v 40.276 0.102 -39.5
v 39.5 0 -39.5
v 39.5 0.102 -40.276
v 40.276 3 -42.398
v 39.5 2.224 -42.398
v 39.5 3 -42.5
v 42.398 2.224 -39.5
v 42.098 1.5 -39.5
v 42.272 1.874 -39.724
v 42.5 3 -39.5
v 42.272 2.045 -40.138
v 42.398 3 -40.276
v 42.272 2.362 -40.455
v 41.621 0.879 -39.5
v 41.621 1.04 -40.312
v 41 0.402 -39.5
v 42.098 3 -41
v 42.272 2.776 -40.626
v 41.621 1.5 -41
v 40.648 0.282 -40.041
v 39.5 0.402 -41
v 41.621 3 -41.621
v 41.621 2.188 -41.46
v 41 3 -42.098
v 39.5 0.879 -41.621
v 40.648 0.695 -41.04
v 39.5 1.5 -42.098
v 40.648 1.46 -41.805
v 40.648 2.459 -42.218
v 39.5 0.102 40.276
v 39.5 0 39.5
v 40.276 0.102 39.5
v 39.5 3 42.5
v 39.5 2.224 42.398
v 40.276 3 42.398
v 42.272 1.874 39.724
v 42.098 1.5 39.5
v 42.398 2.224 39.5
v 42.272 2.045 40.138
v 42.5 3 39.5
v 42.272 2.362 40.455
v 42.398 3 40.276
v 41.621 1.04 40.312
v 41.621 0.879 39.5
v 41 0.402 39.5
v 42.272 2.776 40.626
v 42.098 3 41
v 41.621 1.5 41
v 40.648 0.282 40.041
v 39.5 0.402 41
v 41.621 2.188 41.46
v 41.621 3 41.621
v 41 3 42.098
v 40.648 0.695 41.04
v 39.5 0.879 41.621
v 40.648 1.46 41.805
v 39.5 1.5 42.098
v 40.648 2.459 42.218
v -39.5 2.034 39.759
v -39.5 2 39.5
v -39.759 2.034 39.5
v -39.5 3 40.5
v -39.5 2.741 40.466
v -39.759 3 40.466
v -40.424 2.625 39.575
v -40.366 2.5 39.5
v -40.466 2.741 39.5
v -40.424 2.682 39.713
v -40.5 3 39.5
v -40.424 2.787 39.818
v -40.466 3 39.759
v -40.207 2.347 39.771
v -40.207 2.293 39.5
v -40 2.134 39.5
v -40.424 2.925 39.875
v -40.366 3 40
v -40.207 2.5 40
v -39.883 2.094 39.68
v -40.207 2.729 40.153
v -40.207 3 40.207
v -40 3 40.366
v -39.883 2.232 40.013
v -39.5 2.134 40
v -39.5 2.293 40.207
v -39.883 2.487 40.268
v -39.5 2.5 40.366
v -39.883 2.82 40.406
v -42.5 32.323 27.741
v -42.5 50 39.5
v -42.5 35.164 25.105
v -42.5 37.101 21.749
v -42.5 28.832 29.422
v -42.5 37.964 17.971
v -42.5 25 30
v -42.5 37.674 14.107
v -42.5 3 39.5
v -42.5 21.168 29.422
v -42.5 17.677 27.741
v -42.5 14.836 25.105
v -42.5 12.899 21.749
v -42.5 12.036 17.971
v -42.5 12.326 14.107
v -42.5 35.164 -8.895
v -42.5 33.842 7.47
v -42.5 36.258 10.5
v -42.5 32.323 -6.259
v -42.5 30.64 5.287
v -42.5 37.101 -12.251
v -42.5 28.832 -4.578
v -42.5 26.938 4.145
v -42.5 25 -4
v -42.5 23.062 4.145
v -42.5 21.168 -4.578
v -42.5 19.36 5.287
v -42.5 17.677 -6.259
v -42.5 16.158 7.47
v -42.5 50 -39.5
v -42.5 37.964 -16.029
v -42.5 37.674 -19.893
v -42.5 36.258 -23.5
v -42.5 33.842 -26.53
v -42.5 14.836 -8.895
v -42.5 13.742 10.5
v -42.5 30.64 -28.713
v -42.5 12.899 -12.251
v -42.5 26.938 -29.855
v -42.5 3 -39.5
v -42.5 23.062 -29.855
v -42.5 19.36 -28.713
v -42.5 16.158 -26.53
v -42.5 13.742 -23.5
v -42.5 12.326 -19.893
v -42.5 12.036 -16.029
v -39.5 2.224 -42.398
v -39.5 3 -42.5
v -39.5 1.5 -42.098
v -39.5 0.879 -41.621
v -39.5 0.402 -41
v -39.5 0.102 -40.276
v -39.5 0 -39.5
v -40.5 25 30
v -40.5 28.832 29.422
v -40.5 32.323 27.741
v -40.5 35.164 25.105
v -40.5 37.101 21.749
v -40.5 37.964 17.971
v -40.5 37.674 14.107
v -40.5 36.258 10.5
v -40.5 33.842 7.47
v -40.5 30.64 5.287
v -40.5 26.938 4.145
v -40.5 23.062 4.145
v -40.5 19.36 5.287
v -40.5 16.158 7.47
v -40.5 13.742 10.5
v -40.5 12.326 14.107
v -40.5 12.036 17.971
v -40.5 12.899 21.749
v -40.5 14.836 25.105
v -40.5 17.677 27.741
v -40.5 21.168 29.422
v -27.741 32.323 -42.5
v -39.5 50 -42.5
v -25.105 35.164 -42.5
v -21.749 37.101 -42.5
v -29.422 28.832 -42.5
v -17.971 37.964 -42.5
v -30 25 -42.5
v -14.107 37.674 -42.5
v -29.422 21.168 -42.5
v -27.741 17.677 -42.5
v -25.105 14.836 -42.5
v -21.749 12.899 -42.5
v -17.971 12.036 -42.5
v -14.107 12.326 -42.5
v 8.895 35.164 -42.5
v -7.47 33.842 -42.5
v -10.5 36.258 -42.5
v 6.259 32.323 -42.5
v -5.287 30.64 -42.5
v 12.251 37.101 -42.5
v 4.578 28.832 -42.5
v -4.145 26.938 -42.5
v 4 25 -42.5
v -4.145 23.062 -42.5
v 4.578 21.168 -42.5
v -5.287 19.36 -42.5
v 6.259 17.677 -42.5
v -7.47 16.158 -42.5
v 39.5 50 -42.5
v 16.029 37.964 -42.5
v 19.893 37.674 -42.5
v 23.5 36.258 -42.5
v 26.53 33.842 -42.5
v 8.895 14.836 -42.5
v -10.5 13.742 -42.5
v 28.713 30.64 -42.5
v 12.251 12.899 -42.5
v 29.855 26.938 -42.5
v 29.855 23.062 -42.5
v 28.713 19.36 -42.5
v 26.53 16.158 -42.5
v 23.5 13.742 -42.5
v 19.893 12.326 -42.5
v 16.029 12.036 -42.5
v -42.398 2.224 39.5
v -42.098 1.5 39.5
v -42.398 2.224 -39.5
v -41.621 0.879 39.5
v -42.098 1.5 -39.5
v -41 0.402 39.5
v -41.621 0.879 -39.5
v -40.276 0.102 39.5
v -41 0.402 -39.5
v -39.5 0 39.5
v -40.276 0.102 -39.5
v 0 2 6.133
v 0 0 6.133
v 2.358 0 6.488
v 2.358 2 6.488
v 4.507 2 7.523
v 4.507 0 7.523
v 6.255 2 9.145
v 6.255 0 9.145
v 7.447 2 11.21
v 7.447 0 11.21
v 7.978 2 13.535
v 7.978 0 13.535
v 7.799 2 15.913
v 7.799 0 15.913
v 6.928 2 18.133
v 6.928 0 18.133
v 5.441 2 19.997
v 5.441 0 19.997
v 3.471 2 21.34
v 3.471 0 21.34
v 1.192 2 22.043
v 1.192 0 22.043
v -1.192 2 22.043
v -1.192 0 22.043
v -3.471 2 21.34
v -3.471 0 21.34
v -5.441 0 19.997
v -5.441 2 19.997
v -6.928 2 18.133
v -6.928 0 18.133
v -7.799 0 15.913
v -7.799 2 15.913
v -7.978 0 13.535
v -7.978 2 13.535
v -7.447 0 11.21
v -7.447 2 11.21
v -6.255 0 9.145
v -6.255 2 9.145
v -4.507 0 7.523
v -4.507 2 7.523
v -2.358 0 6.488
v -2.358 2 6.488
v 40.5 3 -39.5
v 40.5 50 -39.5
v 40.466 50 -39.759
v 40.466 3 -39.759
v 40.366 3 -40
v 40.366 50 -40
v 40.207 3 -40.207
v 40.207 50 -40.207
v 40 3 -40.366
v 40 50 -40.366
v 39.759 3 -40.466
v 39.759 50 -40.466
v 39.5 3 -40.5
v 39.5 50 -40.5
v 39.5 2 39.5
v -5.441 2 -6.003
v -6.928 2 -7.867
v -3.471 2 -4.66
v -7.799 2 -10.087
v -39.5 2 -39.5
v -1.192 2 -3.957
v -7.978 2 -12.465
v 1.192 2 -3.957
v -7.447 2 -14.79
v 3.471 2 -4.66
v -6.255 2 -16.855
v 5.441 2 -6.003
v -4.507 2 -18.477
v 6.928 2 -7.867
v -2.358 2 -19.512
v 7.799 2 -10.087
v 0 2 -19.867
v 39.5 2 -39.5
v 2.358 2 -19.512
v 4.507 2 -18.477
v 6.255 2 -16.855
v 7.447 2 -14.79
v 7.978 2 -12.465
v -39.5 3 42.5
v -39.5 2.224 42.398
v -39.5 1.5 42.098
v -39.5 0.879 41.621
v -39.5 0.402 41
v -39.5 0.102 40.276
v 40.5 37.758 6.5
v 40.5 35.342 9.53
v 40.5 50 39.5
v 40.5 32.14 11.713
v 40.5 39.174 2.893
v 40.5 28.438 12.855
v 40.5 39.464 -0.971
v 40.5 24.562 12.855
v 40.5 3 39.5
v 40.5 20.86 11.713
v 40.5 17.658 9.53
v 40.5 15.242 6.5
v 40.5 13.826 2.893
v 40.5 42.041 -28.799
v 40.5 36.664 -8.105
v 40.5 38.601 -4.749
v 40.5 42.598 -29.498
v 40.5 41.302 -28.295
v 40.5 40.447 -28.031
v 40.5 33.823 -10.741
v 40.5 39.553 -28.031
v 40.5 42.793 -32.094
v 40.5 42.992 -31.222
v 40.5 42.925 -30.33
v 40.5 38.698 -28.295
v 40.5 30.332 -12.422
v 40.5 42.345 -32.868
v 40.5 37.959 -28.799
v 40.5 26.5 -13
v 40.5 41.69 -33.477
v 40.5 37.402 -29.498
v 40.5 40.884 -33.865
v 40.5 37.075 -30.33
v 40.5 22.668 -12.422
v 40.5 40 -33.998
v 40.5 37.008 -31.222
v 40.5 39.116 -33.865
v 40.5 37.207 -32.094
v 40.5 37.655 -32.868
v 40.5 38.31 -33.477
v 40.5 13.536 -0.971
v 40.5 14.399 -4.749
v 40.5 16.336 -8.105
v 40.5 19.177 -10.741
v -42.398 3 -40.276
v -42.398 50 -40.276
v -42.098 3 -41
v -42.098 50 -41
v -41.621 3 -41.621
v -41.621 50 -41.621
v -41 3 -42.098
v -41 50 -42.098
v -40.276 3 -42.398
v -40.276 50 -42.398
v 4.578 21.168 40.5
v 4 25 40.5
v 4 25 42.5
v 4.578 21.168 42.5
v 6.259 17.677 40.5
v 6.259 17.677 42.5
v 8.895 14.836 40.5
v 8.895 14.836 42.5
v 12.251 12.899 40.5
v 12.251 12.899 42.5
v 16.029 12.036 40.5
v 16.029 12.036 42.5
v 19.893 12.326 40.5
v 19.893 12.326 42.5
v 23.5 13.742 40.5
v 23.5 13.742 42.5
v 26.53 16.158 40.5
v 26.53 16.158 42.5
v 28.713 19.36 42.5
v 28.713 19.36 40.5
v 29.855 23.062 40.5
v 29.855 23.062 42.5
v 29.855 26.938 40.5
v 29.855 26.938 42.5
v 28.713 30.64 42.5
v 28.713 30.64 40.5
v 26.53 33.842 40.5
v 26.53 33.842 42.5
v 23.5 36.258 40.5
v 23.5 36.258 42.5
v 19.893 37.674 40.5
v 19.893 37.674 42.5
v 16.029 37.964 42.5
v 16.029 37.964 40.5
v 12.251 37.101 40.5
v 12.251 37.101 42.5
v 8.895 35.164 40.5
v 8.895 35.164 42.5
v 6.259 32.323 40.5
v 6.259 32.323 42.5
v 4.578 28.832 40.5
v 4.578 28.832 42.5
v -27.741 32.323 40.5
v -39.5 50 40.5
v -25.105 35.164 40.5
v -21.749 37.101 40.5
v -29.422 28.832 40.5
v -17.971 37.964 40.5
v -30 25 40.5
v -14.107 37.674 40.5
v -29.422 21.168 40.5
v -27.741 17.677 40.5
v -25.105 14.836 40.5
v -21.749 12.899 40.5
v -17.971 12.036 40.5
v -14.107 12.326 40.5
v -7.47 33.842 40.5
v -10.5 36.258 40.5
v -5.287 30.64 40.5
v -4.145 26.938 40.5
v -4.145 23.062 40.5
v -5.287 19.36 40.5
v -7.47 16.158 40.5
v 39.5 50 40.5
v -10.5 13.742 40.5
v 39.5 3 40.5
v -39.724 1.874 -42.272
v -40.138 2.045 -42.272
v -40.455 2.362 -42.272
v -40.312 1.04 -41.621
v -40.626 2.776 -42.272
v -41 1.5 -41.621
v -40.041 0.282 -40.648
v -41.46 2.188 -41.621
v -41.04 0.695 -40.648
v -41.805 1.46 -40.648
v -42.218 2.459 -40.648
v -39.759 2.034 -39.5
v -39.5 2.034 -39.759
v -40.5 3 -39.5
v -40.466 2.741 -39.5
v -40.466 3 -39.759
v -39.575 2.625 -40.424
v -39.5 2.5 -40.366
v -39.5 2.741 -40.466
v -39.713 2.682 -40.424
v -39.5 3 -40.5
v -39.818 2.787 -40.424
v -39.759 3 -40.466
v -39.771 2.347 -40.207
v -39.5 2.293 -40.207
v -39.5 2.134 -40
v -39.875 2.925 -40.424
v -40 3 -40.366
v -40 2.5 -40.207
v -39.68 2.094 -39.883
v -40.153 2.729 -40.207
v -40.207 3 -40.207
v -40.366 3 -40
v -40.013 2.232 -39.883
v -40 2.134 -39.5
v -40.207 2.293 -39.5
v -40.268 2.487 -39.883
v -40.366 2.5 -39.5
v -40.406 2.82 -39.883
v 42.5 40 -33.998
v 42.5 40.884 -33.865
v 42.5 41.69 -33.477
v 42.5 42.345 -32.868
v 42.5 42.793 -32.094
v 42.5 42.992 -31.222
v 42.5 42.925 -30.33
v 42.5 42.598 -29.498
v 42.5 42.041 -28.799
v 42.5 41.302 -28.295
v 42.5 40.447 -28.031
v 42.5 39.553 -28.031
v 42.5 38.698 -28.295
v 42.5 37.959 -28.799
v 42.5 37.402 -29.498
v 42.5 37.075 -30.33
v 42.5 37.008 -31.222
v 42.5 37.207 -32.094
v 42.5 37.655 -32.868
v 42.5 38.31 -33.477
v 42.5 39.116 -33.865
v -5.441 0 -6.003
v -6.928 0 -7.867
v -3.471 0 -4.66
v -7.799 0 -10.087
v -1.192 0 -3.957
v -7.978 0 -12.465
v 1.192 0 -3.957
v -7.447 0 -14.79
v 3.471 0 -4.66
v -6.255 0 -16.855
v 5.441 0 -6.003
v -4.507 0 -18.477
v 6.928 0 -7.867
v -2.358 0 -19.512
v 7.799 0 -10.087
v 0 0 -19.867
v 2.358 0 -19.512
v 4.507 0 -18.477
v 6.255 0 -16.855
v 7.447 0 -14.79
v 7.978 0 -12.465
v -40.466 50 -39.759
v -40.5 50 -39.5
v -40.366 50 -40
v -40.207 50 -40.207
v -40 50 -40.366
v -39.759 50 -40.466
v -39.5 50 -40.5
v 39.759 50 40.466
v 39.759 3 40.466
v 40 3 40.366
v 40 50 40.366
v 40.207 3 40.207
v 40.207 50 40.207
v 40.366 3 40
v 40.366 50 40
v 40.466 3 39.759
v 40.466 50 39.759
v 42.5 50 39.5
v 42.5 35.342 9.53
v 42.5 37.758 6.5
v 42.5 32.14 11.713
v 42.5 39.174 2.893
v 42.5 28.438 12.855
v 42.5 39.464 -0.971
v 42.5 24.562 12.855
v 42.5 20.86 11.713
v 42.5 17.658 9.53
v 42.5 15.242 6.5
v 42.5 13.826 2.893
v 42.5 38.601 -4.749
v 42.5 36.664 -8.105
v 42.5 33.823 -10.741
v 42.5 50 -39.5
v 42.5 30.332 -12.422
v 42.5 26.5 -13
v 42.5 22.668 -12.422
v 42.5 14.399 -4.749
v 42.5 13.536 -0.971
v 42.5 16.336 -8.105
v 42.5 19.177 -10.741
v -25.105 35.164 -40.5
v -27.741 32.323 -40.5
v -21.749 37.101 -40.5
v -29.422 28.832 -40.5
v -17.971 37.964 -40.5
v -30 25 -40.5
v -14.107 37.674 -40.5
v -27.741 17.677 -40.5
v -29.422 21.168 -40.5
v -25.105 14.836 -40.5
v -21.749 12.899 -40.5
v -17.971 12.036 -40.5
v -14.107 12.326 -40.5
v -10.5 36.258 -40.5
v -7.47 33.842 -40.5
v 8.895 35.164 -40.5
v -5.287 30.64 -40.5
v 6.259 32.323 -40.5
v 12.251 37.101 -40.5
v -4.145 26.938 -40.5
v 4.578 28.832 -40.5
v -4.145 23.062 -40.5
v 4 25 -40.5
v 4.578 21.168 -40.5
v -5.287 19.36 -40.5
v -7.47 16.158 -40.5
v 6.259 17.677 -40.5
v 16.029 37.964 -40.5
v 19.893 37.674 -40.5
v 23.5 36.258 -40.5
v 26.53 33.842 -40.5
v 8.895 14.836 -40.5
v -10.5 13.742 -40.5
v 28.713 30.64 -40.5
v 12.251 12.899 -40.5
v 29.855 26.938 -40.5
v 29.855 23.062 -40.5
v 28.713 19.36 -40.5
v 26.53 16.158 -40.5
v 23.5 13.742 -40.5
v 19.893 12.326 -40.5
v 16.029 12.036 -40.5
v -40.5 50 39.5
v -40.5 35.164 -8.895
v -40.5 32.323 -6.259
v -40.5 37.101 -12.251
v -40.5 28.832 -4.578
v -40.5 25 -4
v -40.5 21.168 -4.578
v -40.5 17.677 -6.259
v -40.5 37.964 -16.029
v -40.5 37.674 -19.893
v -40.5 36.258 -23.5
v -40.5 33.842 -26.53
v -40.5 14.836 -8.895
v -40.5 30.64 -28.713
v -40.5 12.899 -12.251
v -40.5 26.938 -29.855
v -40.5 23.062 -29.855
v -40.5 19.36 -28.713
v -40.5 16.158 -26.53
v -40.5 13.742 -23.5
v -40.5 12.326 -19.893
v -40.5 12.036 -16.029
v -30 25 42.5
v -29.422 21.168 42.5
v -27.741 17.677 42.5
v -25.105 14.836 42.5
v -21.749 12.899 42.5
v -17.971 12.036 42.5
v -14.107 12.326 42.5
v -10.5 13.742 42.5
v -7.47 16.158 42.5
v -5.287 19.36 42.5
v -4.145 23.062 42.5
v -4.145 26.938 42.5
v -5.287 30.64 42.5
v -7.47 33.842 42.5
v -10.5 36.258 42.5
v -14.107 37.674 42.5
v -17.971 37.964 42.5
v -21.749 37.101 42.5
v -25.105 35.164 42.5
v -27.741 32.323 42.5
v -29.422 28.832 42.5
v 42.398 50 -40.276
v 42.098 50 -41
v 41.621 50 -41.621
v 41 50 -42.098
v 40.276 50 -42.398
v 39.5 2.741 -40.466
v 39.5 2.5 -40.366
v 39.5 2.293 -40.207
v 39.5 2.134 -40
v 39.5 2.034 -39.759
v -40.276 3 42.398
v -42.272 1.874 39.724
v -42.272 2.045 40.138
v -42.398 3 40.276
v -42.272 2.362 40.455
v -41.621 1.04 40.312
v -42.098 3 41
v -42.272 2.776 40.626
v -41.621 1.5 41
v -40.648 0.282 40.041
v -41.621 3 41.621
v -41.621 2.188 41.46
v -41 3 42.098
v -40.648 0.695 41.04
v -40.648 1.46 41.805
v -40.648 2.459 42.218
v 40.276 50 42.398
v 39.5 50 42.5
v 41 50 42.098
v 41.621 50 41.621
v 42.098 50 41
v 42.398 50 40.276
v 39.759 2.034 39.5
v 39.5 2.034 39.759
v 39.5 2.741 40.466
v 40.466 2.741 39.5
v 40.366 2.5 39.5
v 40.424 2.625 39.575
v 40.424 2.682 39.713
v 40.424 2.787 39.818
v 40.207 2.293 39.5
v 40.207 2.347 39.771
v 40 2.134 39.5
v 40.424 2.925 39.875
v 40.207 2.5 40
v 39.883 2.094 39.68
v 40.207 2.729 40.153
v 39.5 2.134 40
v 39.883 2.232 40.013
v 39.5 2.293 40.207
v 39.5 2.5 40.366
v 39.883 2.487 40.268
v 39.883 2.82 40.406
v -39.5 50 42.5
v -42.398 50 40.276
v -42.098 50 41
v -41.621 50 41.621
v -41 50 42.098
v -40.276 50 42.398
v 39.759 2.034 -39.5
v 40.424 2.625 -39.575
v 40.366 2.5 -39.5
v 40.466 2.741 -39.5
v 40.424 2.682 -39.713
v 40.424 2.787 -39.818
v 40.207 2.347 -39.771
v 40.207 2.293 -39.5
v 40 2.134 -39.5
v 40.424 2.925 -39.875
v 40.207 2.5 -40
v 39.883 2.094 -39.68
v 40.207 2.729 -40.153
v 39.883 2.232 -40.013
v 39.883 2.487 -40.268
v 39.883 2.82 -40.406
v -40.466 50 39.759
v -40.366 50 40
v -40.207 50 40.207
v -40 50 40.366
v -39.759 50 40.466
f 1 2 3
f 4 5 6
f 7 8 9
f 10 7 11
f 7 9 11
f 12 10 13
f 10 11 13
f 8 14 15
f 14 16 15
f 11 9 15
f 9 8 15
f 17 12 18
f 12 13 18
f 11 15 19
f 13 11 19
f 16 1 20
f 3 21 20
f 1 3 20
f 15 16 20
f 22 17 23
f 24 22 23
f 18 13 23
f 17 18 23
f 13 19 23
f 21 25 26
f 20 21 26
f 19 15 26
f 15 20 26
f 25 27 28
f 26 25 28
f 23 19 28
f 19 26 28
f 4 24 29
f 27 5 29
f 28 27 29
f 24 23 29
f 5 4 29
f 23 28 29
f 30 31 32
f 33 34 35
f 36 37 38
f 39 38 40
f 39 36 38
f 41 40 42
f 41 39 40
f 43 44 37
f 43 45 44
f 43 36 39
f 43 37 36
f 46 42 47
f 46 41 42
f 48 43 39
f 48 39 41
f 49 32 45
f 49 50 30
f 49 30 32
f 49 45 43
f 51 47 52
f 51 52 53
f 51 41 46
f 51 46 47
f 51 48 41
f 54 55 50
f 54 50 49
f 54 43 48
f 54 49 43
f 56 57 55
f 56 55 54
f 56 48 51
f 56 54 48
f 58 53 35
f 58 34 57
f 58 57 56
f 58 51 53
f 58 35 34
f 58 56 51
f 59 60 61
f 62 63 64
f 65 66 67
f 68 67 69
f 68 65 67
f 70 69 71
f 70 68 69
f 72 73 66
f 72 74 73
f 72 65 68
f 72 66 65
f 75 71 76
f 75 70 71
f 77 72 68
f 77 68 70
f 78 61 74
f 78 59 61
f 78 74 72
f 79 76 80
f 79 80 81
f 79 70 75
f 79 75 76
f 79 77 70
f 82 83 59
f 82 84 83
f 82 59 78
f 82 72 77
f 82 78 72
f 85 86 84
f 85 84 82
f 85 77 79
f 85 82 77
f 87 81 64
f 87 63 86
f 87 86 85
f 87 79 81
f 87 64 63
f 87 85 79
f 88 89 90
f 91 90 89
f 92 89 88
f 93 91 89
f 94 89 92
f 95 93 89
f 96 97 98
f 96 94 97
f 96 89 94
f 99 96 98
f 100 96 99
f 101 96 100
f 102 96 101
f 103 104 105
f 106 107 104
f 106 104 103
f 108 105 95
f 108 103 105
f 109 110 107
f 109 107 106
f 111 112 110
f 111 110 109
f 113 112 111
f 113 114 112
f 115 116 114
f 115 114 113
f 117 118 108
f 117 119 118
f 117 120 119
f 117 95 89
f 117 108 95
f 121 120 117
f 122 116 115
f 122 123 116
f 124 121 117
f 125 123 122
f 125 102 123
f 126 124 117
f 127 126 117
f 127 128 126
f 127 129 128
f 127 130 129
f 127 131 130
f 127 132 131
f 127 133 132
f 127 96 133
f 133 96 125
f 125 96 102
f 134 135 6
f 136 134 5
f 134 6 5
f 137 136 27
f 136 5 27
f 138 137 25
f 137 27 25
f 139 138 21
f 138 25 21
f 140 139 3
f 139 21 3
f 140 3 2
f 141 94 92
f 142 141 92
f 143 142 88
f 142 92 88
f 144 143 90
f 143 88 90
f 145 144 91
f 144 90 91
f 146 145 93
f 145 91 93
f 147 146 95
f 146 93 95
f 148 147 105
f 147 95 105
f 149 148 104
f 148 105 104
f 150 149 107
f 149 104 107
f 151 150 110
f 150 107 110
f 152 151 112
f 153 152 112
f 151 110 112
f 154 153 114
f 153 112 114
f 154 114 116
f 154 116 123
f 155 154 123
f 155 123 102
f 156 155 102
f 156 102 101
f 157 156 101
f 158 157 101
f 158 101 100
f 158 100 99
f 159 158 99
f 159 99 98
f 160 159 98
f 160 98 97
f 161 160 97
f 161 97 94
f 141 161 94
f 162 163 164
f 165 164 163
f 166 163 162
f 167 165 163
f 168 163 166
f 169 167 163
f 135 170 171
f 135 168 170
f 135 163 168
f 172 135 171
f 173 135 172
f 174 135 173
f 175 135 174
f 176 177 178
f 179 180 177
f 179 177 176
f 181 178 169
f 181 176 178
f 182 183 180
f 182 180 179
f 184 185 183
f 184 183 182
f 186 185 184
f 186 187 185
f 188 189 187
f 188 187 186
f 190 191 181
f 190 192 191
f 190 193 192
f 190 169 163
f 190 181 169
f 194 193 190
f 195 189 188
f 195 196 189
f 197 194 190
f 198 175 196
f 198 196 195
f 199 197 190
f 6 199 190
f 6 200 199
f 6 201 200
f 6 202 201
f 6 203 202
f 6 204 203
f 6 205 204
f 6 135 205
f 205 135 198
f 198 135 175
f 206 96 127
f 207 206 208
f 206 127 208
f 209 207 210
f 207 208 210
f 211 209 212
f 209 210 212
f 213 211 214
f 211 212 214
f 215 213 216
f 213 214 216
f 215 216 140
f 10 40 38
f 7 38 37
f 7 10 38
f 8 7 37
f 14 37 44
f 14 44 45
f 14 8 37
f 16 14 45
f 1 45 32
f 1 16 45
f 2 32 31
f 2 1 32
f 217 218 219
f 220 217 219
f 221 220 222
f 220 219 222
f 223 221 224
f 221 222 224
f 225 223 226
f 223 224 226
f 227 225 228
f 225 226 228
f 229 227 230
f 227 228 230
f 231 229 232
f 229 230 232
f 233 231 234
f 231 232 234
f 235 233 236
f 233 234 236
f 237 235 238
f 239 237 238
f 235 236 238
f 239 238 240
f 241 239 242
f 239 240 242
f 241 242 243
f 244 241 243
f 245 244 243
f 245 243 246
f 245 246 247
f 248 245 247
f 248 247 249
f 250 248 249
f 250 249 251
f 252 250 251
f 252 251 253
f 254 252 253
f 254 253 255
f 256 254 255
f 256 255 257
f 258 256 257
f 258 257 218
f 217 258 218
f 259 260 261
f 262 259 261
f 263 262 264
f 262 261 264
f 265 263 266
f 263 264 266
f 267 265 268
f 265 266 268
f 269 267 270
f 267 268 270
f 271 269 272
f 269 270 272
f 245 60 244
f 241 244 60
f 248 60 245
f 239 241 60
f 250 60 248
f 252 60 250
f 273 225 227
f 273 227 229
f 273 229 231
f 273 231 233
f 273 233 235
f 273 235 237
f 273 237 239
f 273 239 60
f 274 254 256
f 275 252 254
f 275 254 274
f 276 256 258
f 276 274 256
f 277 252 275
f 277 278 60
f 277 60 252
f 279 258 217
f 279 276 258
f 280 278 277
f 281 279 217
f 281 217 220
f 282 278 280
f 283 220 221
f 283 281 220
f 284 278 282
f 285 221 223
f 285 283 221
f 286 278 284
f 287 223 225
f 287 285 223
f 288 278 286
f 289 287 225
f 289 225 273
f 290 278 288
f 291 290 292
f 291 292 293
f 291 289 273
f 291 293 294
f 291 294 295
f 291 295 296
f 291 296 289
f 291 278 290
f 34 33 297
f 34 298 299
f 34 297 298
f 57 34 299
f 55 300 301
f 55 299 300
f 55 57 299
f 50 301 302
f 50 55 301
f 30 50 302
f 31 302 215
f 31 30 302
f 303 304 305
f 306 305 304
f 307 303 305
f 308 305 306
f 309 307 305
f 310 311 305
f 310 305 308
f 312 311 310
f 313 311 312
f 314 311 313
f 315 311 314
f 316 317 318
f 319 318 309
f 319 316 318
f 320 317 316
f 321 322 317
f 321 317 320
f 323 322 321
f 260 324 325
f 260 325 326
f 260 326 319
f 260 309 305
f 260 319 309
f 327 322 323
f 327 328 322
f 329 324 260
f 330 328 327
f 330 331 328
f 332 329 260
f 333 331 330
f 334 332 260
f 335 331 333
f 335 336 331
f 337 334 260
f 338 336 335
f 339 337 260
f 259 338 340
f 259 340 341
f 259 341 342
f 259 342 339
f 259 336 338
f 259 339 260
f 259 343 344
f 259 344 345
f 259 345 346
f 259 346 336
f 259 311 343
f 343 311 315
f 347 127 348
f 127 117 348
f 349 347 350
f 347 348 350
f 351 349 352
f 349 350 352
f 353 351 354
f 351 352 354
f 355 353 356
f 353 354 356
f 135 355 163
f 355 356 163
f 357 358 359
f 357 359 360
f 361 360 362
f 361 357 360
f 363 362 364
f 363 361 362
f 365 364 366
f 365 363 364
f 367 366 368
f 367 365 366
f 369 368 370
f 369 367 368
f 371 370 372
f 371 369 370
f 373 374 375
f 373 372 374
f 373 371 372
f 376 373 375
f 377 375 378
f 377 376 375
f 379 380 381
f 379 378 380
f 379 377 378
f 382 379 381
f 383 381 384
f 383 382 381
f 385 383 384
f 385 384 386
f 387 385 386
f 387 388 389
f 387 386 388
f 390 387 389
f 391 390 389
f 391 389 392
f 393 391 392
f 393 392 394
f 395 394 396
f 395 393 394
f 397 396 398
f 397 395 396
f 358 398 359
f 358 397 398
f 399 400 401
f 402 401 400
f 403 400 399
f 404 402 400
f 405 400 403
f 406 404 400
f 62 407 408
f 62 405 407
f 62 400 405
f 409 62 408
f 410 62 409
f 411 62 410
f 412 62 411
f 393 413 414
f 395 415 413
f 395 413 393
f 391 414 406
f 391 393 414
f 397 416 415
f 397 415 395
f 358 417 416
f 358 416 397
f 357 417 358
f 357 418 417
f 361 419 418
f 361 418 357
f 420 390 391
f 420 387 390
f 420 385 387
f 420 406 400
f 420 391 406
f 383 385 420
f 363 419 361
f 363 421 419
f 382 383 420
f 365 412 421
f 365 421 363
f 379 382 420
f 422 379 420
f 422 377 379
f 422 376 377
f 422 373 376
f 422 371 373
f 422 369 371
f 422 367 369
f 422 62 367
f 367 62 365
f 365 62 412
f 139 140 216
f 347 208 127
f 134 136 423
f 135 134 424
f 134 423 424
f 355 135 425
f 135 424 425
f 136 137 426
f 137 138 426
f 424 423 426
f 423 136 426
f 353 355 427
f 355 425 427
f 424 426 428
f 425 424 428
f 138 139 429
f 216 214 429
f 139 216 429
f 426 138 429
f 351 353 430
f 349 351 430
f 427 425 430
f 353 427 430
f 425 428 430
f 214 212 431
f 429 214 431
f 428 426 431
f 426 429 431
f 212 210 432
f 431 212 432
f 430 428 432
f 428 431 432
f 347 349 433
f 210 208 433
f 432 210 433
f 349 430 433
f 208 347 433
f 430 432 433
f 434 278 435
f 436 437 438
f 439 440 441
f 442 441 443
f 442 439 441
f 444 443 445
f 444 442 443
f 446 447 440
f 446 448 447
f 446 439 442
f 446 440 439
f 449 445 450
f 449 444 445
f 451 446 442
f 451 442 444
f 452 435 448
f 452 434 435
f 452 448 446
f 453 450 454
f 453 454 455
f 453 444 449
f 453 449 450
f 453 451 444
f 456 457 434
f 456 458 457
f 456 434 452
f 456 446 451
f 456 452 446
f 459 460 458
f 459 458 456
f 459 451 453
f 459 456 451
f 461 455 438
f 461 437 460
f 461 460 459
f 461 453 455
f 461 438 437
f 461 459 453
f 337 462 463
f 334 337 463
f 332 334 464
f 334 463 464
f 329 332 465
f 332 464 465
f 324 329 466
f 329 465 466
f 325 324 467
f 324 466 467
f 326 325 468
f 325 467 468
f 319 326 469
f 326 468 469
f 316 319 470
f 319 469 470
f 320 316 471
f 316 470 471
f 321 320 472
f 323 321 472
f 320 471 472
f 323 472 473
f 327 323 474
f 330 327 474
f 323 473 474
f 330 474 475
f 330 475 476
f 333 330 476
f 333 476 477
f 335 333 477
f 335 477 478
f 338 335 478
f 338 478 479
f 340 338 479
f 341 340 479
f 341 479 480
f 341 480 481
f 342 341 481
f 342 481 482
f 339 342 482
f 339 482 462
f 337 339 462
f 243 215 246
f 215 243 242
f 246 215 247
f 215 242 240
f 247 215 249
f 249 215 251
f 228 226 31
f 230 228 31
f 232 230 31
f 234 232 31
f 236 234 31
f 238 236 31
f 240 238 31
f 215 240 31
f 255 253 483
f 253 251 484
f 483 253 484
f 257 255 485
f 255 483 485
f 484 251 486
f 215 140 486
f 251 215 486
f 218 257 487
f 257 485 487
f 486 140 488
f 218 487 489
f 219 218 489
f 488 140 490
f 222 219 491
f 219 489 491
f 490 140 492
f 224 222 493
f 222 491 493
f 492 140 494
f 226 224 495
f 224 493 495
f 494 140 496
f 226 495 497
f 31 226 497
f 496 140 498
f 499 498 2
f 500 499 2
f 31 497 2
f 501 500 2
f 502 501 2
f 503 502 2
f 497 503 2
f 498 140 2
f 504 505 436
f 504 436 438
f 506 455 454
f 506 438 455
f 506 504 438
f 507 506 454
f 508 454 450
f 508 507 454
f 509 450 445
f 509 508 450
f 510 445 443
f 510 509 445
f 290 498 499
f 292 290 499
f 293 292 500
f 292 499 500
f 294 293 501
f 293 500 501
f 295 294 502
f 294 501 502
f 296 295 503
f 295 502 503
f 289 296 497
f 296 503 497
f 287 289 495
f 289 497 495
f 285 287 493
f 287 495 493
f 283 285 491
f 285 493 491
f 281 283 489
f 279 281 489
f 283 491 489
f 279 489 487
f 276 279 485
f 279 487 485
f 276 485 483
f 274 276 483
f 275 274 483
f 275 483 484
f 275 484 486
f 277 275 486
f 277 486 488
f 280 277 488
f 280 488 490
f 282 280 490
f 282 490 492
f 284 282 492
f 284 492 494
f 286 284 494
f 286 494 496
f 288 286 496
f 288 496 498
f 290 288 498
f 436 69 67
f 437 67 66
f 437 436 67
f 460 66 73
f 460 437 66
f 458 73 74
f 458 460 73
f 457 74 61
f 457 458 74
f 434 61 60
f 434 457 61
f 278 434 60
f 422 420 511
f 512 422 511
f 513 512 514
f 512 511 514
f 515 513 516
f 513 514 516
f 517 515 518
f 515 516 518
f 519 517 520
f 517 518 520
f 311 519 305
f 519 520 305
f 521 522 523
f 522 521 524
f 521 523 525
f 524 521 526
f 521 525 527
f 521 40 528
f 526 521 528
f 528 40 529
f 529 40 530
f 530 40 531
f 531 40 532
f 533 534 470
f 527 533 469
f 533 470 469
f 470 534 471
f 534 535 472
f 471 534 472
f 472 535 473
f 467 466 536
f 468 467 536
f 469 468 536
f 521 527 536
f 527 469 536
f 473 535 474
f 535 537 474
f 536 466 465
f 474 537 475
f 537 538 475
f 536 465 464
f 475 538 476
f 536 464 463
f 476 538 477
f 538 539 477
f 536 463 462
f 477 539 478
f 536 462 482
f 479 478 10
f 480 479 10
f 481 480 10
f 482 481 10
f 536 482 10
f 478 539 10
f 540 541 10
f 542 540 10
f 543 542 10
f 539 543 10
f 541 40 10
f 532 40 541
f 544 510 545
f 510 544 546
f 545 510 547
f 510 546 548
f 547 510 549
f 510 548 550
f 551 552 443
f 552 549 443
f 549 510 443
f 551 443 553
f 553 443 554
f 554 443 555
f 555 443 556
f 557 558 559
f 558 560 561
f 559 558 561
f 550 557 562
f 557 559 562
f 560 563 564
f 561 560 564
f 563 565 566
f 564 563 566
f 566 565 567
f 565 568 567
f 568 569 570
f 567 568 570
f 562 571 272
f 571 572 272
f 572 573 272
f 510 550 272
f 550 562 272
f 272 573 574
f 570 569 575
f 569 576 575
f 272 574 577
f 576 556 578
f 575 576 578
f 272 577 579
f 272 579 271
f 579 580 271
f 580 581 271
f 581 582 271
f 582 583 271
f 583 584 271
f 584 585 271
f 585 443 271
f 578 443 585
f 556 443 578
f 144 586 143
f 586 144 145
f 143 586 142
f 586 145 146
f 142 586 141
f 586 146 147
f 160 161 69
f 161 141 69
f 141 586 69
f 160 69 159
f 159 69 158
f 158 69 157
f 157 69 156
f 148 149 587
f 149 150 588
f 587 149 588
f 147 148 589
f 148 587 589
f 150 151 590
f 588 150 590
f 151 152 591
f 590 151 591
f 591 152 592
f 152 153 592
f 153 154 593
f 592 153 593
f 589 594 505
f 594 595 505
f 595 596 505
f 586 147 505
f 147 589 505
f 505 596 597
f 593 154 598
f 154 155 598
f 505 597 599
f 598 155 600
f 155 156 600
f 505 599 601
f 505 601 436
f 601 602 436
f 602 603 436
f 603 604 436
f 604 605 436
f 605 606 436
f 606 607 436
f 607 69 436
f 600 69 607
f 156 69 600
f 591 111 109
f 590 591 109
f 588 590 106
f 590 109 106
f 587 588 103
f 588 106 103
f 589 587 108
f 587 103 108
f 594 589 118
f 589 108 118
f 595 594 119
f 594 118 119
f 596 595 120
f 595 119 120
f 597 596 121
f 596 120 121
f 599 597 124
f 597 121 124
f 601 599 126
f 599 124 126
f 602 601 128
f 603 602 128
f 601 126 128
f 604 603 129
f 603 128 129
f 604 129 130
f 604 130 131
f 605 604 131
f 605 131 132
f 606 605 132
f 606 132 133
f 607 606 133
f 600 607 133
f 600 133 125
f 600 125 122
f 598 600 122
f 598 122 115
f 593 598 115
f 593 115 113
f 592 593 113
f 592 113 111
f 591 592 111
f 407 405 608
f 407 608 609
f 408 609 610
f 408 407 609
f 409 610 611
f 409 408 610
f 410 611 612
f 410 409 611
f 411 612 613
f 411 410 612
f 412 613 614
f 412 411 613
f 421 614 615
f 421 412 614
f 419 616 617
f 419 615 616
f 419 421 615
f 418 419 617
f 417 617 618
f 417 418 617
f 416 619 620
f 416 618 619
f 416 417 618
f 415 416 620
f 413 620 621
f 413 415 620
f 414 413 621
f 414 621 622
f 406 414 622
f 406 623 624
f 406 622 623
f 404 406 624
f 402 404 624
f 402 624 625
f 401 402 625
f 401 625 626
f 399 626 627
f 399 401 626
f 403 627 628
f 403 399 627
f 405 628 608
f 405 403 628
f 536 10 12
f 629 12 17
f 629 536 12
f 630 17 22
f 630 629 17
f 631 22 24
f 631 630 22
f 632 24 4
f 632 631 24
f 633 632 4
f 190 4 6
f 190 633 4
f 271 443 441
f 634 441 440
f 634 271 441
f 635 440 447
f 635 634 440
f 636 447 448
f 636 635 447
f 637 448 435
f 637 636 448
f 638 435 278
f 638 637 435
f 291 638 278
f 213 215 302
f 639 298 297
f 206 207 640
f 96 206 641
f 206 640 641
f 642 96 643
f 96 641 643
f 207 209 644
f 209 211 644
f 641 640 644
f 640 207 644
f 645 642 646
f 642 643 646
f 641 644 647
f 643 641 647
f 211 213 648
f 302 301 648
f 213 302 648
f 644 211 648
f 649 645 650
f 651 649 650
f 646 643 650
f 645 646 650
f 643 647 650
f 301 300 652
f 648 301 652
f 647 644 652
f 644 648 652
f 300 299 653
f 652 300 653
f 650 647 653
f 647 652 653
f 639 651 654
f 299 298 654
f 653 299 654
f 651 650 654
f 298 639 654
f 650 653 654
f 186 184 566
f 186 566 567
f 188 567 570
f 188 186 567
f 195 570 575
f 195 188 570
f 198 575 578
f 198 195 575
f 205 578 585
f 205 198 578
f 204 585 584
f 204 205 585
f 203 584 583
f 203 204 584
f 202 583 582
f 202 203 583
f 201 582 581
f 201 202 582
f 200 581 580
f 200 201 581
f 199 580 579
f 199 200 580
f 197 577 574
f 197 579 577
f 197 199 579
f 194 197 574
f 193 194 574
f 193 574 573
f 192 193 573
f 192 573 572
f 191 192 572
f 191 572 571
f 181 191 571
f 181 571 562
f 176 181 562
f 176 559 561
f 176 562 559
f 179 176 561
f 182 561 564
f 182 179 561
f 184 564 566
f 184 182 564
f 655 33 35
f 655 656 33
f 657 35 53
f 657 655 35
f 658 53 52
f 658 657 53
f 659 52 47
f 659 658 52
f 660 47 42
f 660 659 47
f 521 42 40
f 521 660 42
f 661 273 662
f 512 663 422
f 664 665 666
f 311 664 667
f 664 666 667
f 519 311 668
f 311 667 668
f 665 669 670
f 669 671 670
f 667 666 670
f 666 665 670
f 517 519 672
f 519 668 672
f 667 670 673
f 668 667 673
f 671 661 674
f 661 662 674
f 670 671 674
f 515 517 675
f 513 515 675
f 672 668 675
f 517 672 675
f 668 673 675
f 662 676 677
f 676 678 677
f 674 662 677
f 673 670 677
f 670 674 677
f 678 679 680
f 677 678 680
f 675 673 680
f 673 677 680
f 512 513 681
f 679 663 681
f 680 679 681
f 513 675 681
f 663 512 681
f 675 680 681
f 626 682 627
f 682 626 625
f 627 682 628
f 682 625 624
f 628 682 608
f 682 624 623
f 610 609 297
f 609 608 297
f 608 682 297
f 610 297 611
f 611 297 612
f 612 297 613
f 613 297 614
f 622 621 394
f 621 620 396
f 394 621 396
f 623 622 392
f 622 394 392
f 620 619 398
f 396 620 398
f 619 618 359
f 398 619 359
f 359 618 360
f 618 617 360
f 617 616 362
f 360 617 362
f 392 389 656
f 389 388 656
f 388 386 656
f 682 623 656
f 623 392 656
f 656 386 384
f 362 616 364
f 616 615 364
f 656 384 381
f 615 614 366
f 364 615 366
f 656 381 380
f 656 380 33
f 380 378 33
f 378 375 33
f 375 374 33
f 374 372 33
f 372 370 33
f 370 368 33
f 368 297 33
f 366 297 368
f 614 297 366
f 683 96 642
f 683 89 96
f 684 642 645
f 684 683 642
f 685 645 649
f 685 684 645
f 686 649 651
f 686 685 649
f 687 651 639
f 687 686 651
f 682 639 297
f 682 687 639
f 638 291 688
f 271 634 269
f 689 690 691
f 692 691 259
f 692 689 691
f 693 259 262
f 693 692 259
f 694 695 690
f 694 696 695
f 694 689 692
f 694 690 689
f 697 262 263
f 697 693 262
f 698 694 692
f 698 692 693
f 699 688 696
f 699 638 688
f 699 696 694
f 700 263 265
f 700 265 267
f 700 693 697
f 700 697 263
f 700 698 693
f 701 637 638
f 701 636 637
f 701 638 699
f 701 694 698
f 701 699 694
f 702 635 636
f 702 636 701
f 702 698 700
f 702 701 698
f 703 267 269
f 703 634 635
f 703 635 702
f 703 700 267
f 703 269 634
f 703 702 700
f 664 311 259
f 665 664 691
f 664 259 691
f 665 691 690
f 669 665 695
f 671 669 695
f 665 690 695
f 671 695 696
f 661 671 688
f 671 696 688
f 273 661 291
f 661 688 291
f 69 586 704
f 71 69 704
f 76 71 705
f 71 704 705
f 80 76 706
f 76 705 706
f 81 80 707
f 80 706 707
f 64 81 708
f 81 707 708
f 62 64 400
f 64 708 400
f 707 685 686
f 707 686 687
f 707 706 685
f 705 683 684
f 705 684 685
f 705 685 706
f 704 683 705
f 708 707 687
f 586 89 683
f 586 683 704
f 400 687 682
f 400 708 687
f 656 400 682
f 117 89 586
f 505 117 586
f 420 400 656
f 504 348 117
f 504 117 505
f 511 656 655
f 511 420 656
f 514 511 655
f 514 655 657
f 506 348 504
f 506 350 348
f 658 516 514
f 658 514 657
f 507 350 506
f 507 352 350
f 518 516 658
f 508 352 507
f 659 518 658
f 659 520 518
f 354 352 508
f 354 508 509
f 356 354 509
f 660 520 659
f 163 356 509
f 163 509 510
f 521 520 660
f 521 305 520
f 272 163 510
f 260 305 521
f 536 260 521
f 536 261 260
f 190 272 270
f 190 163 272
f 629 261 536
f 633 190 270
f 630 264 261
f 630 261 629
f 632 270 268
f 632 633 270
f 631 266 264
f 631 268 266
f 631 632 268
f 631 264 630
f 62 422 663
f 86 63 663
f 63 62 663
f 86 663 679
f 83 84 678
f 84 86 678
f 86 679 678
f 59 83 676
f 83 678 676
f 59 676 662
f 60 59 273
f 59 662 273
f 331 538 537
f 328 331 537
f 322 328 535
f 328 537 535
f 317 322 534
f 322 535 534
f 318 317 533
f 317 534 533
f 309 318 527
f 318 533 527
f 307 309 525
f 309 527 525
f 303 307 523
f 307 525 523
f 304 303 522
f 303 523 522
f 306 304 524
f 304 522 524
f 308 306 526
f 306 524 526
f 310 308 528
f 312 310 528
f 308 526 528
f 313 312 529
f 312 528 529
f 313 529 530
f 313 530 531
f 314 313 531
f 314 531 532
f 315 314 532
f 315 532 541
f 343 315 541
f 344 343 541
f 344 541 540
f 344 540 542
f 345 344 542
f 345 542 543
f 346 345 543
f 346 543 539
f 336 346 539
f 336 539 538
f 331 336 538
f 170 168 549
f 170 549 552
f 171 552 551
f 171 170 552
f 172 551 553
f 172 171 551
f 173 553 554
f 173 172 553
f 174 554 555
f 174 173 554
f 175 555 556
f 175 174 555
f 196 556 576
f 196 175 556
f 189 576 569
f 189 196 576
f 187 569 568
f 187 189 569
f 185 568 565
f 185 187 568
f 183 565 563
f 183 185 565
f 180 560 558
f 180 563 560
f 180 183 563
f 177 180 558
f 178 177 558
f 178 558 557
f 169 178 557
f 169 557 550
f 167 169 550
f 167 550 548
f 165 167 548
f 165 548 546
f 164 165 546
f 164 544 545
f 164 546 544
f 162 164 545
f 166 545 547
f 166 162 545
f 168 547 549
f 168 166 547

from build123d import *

# Parameters (mm, degrees)
SKETCH1_W               = 85
SKETCH1_H               = 85
BOSS_EXTRUDE1_DEPTH     = 50
FILLET1_R               = 3
SHELL2_T                = -2
SKETCH2_R               = 8
CUT_EXTRUDE1_DEPTH      = 50
CUT_EXTRUDE2_DEPTH      = 108.383657975
CUT_EXTRUDE2_DEPTH_BACK = 108.383657975
SKETCH3_R               = 13
SKETCH4_R               = 13
SKETCH4_R_2             = 3
CUT_EXTRUDE3_DEPTH      = 50
SKETCH5_R               = 13
CUT_EXTRUDE4_DEPTH      = 50


with BuildPart() as part:
    # Sketch1 → Boss-Extrude1 (new body)
    with BuildSketch(Plane(origin=(0, 0, 0), x_dir=(1, 0, 0), z_dir=(0, 1, 0))):
        Rectangle(SKETCH1_W, SKETCH1_H)
    extrude(amount=BOSS_EXTRUDE1_DEPTH)

    # Fillet1
    fillet1_edges = [part.edges().sort_by_distance(p)[0] for p in [
        (0, 0, 42.5),
        (-42.5, 0, 0),
        (0, 0, -42.5),
        (42.5, 0, 0),
        (42.5, 25, 42.5),
        (-42.5, 25, 42.5),
        (-42.5, 25, -42.5),
        (42.5, 25, -42.5),
    ]]
    fillet(fillet1_edges, radius=FILLET1_R)

    # Shell2
    shell2_openings = [part.faces().sort_by_distance(p)[0] for p in [
        (0, 50, 0),
    ]]
    offset(amount=SHELL2_T, openings=shell2_openings, kind=Kind.INTERSECTION)

    # Sketch2 → Cut-Extrude1 (cut)
    with BuildSketch(Plane.XZ):
        with Locations(Location((0, 14.13265191, 0), (0, 0, 270))):
            Circle(SKETCH2_R)
        with Locations(Location((0, -11.86734809, 0), (0, 0, 270))):
            Circle(SKETCH2_R)
    extrude(amount=-CUT_EXTRUDE1_DEPTH, mode=Mode.SUBTRACT)

    # Sketch3 → Cut-Extrude2 (cut, two sides: drawn at the far end of the back side and taken through both)
    with BuildSketch(Plane.XY.offset(42.5).offset(-CUT_EXTRUDE2_DEPTH_BACK)):
        with Locations(Location((-17, 25, 0), (0, 0, 180))):
            Circle(SKETCH3_R)
        with Locations(Location((17, 25, 0), (0, 0, 180))):
            Circle(SKETCH3_R)
    extrude(amount=CUT_EXTRUDE2_DEPTH + CUT_EXTRUDE2_DEPTH_BACK, mode=Mode.SUBTRACT)

    # Sketch4 → Cut-Extrude3 (cut)
    with BuildSketch(Plane(origin=(42.5, 0, 0), x_dir=(0, 0, -1), z_dir=(1, 0, 0))):
        with Locations((0, 26.5)):
            Circle(SKETCH4_R)
        with Locations((30.997938674, 40)):
            Circle(SKETCH4_R_2)
    extrude(amount=-CUT_EXTRUDE3_DEPTH, mode=Mode.SUBTRACT)

    # Sketch5 → Cut-Extrude4 (cut)
    with BuildSketch(Plane.ZY.offset(42.5)):
        with Locations((-17, 25)):
            Circle(SKETCH5_R)
        with Locations((17, 25)):
            Circle(SKETCH5_R)
    extrude(amount=-CUT_EXTRUDE4_DEPTH, mode=Mode.SUBTRACT)


solid = part.part
